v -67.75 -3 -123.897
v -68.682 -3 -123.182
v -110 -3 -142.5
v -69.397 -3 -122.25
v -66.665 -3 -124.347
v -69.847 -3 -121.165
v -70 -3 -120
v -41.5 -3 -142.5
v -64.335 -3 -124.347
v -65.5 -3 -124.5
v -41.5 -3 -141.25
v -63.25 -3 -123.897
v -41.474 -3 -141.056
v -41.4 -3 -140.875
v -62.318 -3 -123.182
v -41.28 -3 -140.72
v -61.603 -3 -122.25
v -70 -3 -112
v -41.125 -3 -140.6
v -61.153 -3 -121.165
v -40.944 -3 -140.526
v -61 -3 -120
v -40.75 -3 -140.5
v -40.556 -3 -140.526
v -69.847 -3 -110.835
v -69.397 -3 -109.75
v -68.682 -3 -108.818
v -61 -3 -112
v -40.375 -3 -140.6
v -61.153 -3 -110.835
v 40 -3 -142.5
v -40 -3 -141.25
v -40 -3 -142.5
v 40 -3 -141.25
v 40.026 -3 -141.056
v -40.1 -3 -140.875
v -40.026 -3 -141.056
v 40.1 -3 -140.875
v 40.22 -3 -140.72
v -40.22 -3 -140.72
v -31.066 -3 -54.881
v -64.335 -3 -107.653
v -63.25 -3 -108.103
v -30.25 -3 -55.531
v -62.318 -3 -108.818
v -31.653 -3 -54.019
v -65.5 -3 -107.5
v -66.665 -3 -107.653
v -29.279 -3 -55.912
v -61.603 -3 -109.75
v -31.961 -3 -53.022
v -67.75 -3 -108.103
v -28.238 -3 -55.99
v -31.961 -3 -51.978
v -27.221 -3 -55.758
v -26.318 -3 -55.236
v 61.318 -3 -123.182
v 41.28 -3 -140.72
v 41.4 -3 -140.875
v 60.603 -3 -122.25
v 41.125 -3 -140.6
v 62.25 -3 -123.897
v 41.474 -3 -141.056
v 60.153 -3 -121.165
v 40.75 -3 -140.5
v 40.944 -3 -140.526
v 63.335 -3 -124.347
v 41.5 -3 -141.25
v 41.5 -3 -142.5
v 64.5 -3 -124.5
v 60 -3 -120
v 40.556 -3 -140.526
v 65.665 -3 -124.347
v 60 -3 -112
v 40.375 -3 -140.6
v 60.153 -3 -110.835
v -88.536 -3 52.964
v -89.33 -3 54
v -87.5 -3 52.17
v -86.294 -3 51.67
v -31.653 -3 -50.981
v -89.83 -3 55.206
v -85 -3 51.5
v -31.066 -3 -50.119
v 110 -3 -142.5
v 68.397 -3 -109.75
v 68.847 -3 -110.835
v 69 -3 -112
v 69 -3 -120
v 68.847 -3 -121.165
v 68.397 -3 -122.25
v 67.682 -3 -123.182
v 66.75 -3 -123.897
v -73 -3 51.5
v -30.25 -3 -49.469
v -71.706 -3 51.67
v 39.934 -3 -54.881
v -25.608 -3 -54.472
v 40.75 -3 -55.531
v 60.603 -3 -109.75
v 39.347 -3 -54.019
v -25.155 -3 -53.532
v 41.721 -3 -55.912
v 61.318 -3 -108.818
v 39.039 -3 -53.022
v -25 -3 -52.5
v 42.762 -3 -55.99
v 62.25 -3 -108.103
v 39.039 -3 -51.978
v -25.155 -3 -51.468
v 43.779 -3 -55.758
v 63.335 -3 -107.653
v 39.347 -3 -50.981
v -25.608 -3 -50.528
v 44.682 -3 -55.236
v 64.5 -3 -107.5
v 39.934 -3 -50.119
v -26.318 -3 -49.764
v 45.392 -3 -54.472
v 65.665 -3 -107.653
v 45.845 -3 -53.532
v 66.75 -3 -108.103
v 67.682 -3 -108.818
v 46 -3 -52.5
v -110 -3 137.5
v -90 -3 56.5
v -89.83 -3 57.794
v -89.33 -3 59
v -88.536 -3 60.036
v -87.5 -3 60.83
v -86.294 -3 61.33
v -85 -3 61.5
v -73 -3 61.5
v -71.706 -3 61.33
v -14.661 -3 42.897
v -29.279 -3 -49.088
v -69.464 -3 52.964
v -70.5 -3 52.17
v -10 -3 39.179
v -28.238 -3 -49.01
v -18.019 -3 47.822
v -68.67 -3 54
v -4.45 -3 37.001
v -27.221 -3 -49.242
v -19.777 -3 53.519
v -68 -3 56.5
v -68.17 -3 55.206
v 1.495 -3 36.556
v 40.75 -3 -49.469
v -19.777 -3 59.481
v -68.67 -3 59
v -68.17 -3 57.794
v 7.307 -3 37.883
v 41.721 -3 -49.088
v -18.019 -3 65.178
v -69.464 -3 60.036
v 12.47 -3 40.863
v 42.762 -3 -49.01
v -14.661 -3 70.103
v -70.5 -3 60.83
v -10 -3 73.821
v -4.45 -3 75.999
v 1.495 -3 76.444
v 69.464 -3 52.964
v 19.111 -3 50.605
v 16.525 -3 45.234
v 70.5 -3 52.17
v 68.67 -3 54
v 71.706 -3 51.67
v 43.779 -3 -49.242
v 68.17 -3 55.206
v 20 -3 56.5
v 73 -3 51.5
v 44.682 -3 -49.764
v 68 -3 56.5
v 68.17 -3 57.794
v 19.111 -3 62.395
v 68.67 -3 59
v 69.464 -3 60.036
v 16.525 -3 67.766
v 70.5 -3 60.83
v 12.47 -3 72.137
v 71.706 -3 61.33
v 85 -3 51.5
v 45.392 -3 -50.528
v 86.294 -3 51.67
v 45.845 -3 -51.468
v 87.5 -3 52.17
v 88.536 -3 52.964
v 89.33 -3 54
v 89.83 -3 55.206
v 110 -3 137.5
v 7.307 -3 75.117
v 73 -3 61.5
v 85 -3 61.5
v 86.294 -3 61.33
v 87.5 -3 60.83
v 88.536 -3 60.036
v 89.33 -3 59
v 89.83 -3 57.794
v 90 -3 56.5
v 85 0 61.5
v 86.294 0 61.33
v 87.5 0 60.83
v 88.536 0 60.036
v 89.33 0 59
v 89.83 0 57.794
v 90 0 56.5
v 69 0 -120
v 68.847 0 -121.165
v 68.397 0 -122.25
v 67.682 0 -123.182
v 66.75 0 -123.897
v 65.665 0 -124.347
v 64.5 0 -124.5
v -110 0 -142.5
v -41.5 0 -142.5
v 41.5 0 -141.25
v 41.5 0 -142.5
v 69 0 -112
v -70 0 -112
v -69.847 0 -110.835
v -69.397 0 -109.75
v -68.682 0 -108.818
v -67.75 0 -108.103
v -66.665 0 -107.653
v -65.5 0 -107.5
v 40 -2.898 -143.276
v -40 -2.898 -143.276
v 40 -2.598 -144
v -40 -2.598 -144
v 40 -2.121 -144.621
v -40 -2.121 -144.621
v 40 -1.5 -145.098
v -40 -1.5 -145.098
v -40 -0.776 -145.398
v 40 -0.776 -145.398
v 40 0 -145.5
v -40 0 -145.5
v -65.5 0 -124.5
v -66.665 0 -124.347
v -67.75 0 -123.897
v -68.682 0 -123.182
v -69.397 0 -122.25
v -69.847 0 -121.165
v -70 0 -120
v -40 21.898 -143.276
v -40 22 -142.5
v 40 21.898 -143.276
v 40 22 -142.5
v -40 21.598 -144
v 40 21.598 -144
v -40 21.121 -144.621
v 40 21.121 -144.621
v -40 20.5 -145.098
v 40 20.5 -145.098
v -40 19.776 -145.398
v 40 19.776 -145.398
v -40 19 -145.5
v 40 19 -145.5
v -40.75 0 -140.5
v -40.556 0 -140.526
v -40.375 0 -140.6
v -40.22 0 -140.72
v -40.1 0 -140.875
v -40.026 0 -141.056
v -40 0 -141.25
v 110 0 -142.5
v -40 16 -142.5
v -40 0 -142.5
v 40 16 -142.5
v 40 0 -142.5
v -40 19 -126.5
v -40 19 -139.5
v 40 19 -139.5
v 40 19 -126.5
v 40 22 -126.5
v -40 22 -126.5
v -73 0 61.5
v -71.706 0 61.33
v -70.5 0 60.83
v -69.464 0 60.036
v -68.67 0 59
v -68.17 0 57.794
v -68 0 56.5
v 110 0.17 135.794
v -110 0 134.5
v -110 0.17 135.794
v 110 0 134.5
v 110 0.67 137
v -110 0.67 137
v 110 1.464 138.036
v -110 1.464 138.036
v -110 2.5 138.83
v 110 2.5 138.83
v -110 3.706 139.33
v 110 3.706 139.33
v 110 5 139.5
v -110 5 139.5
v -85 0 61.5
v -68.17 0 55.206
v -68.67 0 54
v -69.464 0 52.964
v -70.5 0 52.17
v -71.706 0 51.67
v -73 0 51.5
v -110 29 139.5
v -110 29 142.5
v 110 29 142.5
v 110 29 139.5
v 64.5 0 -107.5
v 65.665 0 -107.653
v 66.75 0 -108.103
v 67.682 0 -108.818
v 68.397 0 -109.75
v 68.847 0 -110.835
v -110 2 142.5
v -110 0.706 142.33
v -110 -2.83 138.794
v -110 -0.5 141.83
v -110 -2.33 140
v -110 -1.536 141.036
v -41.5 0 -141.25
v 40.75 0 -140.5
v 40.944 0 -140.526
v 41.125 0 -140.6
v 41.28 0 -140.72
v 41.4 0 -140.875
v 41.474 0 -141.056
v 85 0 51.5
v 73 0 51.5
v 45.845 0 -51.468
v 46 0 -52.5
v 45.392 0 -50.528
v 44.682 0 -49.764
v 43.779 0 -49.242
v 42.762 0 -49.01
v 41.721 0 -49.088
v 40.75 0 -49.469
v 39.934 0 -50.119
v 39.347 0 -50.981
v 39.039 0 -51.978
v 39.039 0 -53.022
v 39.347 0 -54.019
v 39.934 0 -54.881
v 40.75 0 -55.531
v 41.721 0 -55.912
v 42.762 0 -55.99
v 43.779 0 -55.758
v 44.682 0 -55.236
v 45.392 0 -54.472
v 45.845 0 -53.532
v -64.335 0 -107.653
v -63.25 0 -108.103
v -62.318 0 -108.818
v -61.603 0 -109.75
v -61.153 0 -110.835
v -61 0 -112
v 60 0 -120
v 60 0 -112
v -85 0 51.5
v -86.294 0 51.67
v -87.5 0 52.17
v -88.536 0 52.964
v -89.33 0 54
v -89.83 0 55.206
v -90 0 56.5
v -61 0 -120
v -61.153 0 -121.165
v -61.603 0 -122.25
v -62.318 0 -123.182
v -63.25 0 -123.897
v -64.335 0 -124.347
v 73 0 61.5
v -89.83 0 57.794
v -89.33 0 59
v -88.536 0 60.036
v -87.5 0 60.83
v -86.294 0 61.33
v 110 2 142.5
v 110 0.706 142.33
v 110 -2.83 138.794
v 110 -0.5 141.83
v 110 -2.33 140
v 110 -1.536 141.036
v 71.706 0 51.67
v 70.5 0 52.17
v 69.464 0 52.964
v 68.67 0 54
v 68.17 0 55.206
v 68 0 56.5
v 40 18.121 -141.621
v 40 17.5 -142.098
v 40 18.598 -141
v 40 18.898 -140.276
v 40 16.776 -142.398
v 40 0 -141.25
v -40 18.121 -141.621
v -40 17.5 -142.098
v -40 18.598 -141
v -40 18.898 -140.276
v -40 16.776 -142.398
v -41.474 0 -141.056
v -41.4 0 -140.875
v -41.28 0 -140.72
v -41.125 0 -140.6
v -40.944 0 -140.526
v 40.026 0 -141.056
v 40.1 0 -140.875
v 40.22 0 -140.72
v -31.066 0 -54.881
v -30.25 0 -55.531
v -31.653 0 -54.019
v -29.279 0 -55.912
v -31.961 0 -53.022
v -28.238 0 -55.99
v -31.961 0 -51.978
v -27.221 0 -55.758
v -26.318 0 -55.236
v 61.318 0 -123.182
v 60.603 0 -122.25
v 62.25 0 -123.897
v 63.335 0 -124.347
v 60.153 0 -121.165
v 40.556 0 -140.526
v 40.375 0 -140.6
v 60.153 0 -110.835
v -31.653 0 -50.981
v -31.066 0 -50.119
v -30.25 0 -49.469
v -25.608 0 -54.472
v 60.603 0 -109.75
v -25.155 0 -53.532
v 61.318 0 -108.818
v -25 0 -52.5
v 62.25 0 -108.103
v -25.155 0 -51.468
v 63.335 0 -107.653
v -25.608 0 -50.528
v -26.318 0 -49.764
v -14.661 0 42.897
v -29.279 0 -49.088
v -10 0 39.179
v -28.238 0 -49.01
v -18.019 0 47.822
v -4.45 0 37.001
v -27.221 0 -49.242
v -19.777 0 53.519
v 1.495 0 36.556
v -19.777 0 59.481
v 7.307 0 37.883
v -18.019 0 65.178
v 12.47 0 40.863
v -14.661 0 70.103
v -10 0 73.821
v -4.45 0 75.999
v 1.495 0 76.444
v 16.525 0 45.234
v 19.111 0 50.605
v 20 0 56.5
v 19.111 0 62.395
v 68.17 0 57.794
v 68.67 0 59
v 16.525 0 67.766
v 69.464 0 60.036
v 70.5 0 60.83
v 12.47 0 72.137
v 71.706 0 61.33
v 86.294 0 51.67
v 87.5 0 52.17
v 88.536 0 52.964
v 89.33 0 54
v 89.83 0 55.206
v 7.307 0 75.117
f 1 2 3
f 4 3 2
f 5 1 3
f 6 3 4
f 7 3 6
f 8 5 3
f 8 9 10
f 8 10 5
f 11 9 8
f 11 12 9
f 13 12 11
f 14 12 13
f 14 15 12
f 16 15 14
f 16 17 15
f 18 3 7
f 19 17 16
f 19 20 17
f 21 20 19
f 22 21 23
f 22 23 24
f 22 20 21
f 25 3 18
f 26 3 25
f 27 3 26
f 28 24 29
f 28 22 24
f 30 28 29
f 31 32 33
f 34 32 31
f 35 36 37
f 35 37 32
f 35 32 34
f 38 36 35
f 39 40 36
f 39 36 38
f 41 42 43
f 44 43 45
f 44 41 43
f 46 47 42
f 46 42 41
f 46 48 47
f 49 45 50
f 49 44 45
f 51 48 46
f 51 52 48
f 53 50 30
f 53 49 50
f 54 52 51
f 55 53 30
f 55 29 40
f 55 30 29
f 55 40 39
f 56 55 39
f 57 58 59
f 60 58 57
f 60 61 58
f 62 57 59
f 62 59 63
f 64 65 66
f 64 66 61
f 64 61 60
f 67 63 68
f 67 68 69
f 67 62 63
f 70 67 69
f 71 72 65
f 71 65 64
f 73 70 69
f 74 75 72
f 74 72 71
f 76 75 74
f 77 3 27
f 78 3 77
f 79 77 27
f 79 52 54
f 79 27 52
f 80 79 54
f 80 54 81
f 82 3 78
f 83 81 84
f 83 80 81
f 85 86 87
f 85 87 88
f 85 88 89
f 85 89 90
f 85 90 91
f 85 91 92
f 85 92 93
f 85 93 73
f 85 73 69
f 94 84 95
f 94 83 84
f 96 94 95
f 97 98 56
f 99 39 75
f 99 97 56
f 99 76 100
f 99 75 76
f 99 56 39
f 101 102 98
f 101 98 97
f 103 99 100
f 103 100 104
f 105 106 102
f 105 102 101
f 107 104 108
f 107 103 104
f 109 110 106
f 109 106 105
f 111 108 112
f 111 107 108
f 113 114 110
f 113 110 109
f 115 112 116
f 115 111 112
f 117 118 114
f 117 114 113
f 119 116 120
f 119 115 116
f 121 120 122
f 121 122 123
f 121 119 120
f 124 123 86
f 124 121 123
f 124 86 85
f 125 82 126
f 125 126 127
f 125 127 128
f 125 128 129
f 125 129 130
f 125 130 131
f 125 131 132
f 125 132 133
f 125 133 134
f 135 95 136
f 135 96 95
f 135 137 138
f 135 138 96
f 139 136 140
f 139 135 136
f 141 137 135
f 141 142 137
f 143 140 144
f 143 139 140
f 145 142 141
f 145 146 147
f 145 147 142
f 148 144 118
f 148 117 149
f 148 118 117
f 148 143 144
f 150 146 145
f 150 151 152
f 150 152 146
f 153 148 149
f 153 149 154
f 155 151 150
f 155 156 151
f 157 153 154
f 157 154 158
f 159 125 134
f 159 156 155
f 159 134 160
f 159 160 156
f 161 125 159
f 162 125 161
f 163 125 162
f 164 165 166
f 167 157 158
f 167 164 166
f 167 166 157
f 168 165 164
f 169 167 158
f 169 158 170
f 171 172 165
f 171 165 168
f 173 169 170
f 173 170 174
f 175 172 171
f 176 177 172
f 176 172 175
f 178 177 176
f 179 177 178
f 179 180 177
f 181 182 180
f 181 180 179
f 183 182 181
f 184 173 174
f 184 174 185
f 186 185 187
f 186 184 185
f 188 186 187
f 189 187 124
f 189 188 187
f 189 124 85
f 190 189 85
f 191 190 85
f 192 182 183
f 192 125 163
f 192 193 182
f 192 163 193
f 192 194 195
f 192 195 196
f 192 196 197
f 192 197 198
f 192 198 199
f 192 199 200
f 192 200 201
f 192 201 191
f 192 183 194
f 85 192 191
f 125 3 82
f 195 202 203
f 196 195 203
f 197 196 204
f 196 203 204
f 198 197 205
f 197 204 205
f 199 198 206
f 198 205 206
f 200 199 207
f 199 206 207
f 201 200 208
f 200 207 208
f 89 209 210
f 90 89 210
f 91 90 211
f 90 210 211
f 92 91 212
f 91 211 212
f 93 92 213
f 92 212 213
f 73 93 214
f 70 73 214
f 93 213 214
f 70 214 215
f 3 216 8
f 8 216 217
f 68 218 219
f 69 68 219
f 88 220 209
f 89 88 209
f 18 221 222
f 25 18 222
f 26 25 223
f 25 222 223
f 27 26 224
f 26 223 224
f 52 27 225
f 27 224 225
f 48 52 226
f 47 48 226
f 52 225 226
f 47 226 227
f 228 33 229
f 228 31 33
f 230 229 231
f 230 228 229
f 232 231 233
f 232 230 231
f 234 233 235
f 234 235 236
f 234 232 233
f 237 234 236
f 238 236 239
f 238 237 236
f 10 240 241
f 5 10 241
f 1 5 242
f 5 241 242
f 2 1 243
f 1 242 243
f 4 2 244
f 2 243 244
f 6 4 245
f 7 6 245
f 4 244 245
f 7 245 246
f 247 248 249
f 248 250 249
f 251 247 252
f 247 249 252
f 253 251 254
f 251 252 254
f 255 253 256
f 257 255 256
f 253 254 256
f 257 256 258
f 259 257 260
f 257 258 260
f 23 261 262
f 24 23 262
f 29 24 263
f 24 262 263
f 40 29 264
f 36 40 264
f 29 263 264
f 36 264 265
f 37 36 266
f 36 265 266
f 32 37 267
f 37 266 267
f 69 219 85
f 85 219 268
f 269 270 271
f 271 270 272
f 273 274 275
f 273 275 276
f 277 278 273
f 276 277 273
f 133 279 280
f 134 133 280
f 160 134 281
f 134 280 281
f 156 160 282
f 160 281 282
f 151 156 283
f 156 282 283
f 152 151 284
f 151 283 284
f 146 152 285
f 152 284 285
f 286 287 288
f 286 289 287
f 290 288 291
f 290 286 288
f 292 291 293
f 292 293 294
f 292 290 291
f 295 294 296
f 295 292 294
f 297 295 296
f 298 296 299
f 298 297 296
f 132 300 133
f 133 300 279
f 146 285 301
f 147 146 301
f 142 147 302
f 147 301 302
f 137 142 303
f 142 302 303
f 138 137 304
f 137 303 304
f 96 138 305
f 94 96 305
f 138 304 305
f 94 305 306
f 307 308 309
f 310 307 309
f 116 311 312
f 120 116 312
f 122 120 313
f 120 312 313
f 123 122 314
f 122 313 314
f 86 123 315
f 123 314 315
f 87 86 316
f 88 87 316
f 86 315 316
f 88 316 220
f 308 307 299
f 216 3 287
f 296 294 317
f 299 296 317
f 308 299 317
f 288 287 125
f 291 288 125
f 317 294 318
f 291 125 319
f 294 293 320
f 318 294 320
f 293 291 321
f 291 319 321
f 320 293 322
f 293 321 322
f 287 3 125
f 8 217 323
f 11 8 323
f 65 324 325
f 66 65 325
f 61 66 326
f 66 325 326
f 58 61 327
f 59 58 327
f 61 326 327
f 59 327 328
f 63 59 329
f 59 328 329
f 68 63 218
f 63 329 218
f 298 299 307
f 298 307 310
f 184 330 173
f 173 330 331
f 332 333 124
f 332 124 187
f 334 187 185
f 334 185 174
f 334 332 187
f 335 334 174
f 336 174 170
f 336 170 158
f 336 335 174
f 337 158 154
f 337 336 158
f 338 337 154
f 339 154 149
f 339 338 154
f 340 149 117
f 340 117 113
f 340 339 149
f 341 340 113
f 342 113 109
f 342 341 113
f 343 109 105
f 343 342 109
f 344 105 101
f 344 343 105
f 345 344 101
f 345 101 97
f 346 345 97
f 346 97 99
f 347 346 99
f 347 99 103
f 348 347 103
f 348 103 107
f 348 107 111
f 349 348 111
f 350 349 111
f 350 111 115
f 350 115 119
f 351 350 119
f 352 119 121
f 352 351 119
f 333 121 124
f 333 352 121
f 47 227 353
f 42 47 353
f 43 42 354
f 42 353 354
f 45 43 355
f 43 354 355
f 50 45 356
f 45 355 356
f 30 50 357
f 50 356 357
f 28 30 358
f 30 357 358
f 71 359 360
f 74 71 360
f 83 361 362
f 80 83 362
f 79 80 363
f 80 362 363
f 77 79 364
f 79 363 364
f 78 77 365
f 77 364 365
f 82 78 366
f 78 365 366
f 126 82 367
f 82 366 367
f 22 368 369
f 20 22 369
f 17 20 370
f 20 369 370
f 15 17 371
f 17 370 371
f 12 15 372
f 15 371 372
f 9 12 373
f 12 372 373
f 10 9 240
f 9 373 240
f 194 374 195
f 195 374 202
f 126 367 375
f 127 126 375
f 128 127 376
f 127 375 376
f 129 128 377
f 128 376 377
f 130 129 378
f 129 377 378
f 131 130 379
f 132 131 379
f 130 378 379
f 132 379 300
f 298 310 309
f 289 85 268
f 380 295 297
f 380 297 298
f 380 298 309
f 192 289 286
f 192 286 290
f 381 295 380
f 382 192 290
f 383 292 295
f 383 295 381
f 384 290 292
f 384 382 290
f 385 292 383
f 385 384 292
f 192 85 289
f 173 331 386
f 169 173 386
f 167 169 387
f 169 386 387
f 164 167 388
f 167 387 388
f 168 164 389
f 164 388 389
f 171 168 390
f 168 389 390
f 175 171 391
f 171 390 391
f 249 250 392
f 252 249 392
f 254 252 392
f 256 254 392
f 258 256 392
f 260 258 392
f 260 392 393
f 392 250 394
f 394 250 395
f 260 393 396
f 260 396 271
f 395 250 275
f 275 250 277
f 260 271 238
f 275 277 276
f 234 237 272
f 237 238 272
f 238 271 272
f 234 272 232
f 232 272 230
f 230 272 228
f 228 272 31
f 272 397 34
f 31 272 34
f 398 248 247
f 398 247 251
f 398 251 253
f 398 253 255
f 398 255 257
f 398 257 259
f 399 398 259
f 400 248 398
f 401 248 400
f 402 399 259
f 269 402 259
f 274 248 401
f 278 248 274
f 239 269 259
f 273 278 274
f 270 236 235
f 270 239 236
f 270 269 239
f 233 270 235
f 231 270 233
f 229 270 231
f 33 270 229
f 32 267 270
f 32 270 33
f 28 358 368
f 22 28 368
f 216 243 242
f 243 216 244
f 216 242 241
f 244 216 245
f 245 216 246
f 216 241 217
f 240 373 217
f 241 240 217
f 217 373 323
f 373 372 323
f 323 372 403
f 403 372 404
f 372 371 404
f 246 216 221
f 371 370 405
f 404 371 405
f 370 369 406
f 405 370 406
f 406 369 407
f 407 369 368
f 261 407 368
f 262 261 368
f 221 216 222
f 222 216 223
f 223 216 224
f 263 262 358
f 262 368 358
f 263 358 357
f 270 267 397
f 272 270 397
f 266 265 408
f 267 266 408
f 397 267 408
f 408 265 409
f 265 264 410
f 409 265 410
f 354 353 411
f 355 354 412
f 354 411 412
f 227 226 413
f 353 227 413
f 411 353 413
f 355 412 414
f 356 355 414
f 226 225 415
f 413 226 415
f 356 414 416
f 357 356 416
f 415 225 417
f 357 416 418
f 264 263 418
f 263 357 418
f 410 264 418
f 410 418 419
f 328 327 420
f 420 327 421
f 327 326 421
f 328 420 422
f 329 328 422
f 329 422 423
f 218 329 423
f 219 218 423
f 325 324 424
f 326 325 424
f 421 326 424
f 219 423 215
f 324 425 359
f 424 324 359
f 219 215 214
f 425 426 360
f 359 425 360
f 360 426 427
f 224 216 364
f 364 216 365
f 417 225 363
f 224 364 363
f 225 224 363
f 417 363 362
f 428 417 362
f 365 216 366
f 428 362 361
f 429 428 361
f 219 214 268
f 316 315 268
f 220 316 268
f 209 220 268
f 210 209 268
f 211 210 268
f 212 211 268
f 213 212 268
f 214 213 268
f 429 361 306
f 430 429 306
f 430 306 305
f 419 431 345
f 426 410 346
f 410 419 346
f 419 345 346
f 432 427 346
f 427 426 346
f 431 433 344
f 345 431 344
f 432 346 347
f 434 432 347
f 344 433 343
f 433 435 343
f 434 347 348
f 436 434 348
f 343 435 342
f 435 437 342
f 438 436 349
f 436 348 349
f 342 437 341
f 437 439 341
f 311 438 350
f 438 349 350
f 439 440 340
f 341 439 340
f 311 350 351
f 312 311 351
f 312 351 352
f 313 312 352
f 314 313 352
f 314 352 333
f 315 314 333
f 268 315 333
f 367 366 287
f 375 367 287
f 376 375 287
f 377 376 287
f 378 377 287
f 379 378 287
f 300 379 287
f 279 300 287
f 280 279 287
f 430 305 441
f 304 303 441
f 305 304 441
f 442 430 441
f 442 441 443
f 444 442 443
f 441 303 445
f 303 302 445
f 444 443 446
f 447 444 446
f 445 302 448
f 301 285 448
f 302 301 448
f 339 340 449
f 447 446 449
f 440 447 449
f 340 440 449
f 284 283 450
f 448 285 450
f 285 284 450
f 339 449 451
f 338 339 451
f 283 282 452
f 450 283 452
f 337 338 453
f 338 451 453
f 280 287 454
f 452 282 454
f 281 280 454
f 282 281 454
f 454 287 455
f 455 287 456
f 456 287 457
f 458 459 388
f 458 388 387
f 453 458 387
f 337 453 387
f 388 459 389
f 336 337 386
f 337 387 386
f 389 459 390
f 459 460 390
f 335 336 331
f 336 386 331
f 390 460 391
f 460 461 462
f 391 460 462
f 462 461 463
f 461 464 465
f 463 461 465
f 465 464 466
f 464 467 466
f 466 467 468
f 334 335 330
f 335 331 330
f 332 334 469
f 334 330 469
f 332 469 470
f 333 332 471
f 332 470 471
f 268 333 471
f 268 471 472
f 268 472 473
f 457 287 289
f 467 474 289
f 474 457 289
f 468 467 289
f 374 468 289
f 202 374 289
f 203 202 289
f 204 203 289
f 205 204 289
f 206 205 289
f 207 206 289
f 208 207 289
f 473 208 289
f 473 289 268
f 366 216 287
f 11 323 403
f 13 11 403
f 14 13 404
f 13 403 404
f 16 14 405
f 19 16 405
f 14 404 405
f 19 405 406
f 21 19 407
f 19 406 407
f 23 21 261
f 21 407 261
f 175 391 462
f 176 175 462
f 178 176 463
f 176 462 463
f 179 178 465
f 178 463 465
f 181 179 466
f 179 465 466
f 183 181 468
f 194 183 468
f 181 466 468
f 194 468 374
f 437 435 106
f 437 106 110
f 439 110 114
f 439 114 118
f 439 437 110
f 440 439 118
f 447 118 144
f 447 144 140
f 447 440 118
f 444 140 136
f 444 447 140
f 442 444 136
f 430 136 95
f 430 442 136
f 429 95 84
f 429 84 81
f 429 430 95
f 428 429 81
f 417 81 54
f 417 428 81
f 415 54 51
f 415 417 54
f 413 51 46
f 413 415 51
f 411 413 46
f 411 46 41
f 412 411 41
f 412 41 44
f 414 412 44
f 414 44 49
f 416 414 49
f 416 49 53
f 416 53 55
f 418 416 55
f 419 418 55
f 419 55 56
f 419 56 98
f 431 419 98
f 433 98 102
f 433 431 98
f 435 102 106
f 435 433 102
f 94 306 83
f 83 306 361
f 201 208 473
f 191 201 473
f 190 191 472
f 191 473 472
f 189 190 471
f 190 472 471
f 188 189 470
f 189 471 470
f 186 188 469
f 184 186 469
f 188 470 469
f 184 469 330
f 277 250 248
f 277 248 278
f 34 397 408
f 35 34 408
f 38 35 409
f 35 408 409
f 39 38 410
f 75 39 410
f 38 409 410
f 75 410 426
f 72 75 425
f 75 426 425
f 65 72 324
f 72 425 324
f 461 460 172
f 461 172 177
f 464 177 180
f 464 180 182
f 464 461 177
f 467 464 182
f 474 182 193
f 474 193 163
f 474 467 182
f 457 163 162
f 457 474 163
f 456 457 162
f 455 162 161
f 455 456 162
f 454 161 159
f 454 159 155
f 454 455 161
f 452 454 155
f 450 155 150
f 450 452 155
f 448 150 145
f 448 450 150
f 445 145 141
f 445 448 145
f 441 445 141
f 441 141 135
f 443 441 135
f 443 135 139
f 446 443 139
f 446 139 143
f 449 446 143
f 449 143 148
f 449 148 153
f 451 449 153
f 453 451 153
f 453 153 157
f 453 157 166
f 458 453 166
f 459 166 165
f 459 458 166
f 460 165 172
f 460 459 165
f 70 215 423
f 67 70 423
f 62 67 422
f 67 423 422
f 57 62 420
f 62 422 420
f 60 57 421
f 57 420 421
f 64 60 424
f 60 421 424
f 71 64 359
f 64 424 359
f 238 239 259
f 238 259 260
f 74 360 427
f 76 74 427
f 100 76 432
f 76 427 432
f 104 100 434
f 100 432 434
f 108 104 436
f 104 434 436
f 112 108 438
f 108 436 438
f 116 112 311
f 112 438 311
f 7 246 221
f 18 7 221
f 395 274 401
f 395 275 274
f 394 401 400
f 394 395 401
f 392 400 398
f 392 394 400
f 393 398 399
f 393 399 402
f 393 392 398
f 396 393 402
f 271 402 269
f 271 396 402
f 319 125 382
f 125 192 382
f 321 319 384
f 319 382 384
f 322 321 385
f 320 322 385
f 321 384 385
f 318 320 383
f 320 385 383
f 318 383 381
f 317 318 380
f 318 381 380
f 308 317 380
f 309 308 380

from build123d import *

# Parameters (mm, degrees)
F0_R          = 3.5
F0_R_2        = 20
F1_DEPTH      = 3
F0_W          = 220
F0_H          = 3
F2_DEPTH      = 3
F2_DEPTH_BACK = 29
F3_R          = 5
F0_W_2        = 80
F4_DEPTH      = 3
F4_DEPTH_BACK = 22
F5_R          = 3
F6_W          = 3
F6_H          = 16
F7_DEPTH      = 80
F8_R          = 3


with BuildPart() as f1:
    # F0 (on Front) → F1 (new body)
    with BuildSketch(Plane.XZ):
        with BuildLine():
            Line((41.5, -142.5), (110, -142.5))
            Line((110, -142.5), (110, 139.5))
            Line((110, 139.5), (-110, 139.5))
            Line((-110, 139.5), (-110, -142.5))
            Line((-110, -142.5), (-41.5, -142.5))
            Line((-41.5, -142.5), (-41.5, -141.25))
            ThreePointArc((-41.5, -141.25), (-41.2803300859, -140.7196699141), (-40.75, -140.5))
            ThreePointArc((-40.75, -140.5), (-40.2196699141, -140.7196699141), (-40, -141.25))
            Line((-40, -141.25), (-40, -142.5))
            Line((-40, -142.5), (40, -142.5))
            Line((40, -142.5), (40, -141.25))
            ThreePointArc((40, -141.25), (40.2196699141, -140.7196699141), (40.75, -140.5))
            ThreePointArc((40.75, -140.5), (41.2803300859, -140.7196699141), (41.5, -141.25))
            Line((41.5, -141.25), (41.5, -142.5))
        make_face()
        with BuildLine():
            ThreePointArc((-65.5, -124.5), (-68.6819805153, -123.1819805153), (-70, -120))
            Line((-70, -120), (-70, -112))
            ThreePointArc((-70, -112), (-68.6819805153, -108.8180194847), (-65.5, -107.5))
            ThreePointArc((-65.5, -107.5), (-62.3180194847, -108.8180194847), (-61, -112))
            Line((-61, -112), (-61, -120))
            ThreePointArc((-61, -120), (-62.3180194847, -123.1819805153), (-65.5, -124.5))
        make_face(mode=Mode.SUBTRACT)
        with Locations((-28.5, -52.5)):
            Circle(F0_R, mode=Mode.SUBTRACT)
        with BuildLine():
            ThreePointArc((64.5, -107.5), (67.6819805153, -108.8180194847), (69, -112))
            Line((69, -112), (69, -120))
            ThreePointArc((69, -120), (67.6819805153, -123.1819805153), (64.5, -124.5))
            ThreePointArc((64.5, -124.5), (61.3180194847, -123.1819805153), (60, -120))
            Line((60, -120), (60, -112))
            ThreePointArc((60, -112), (61.3180194847, -108.8180194847), (64.5, -107.5))
        make_face(mode=Mode.SUBTRACT)
        with Locations((42.5, -52.5)):
            Circle(F0_R, mode=Mode.SUBTRACT)
        with BuildLine():
            ThreePointArc((-90, 56.5), (-88.5355339059, 60.0355339059), (-85, 61.5))
            Line((-85, 61.5), (-73, 61.5))
            ThreePointArc((-73, 61.5), (-69.4644660941, 60.0355339059), (-68, 56.5))
            ThreePointArc((-68, 56.5), (-69.4644660941, 52.9644660941), (-73, 51.5))
            Line((-73, 51.5), (-85, 51.5))
            ThreePointArc((-85, 51.5), (-88.5355339059, 52.9644660941), (-90, 56.5))
        make_face(mode=Mode.SUBTRACT)
        with Locations((0, 56.5)):
            Circle(F0_R_2, mode=Mode.SUBTRACT)
        with BuildLine():
            Line((73, 61.5), (85, 61.5))
            ThreePointArc((85, 61.5), (88.5355339059, 60.0355339059), (90, 56.5))
            ThreePointArc((90, 56.5), (88.5355339059, 52.9644660941), (85, 51.5))
            Line((85, 51.5), (73, 51.5))
            ThreePointArc((73, 51.5), (69.4644660941, 52.9644660941), (68, 56.5))
            ThreePointArc((68, 56.5), (69.4644660941, 60.0355339059), (73, 61.5))
        make_face(mode=Mode.SUBTRACT)
    extrude(amount=F1_DEPTH)

    # F0 (on Front) → F2 (join, two sides)
    with BuildSketch(Plane.XZ) as f2_sk:
        with Locations((0, 141)):
            Rectangle(F0_W, F0_H)
    extrude(amount=F2_DEPTH)
    extrude(f2_sk.sketch, amount=-F2_DEPTH_BACK)

    # F3
    f3_edges = [f1.edges().sort_by_distance(p)[0] for p in [
        (0, -3, 142.5),
        (0, 0, 139.5),
    ]]
    fillet(f3_edges, radius=F3_R)

    # F0 (on Front) → F4 (join, two sides)
    with BuildSketch(Plane.XZ) as f4_sk:
        with Locations((0, -144)):
            Rectangle(F0_W_2, F0_H)
    extrude(amount=F4_DEPTH)
    extrude(f4_sk.sketch, amount=-F4_DEPTH_BACK)

    # F5
    f5_edges = [f1.edges().sort_by_distance(p)[0] for p in [
        (0, -3, -145.5),
    ]]
    fillet(f5_edges, radius=F5_R)

    # F6 (on face) → F7 (join)
    with BuildSketch(Plane(origin=(-40, 0, 0), x_dir=(0, -1, 0), z_dir=(-1, 0, 0))):
        with Locations((-20.5, -134.5)):
            Rectangle(F6_W, F6_H)
    extrude(amount=-F7_DEPTH)

    # F8
    f8_edges = [f1.edges().sort_by_distance(p)[0] for p in [
        (0, 22, -145.5),
        (0, 19, -142.5),
    ]]
    fillet(f8_edges, radius=F8_R)


solid = f1.part
